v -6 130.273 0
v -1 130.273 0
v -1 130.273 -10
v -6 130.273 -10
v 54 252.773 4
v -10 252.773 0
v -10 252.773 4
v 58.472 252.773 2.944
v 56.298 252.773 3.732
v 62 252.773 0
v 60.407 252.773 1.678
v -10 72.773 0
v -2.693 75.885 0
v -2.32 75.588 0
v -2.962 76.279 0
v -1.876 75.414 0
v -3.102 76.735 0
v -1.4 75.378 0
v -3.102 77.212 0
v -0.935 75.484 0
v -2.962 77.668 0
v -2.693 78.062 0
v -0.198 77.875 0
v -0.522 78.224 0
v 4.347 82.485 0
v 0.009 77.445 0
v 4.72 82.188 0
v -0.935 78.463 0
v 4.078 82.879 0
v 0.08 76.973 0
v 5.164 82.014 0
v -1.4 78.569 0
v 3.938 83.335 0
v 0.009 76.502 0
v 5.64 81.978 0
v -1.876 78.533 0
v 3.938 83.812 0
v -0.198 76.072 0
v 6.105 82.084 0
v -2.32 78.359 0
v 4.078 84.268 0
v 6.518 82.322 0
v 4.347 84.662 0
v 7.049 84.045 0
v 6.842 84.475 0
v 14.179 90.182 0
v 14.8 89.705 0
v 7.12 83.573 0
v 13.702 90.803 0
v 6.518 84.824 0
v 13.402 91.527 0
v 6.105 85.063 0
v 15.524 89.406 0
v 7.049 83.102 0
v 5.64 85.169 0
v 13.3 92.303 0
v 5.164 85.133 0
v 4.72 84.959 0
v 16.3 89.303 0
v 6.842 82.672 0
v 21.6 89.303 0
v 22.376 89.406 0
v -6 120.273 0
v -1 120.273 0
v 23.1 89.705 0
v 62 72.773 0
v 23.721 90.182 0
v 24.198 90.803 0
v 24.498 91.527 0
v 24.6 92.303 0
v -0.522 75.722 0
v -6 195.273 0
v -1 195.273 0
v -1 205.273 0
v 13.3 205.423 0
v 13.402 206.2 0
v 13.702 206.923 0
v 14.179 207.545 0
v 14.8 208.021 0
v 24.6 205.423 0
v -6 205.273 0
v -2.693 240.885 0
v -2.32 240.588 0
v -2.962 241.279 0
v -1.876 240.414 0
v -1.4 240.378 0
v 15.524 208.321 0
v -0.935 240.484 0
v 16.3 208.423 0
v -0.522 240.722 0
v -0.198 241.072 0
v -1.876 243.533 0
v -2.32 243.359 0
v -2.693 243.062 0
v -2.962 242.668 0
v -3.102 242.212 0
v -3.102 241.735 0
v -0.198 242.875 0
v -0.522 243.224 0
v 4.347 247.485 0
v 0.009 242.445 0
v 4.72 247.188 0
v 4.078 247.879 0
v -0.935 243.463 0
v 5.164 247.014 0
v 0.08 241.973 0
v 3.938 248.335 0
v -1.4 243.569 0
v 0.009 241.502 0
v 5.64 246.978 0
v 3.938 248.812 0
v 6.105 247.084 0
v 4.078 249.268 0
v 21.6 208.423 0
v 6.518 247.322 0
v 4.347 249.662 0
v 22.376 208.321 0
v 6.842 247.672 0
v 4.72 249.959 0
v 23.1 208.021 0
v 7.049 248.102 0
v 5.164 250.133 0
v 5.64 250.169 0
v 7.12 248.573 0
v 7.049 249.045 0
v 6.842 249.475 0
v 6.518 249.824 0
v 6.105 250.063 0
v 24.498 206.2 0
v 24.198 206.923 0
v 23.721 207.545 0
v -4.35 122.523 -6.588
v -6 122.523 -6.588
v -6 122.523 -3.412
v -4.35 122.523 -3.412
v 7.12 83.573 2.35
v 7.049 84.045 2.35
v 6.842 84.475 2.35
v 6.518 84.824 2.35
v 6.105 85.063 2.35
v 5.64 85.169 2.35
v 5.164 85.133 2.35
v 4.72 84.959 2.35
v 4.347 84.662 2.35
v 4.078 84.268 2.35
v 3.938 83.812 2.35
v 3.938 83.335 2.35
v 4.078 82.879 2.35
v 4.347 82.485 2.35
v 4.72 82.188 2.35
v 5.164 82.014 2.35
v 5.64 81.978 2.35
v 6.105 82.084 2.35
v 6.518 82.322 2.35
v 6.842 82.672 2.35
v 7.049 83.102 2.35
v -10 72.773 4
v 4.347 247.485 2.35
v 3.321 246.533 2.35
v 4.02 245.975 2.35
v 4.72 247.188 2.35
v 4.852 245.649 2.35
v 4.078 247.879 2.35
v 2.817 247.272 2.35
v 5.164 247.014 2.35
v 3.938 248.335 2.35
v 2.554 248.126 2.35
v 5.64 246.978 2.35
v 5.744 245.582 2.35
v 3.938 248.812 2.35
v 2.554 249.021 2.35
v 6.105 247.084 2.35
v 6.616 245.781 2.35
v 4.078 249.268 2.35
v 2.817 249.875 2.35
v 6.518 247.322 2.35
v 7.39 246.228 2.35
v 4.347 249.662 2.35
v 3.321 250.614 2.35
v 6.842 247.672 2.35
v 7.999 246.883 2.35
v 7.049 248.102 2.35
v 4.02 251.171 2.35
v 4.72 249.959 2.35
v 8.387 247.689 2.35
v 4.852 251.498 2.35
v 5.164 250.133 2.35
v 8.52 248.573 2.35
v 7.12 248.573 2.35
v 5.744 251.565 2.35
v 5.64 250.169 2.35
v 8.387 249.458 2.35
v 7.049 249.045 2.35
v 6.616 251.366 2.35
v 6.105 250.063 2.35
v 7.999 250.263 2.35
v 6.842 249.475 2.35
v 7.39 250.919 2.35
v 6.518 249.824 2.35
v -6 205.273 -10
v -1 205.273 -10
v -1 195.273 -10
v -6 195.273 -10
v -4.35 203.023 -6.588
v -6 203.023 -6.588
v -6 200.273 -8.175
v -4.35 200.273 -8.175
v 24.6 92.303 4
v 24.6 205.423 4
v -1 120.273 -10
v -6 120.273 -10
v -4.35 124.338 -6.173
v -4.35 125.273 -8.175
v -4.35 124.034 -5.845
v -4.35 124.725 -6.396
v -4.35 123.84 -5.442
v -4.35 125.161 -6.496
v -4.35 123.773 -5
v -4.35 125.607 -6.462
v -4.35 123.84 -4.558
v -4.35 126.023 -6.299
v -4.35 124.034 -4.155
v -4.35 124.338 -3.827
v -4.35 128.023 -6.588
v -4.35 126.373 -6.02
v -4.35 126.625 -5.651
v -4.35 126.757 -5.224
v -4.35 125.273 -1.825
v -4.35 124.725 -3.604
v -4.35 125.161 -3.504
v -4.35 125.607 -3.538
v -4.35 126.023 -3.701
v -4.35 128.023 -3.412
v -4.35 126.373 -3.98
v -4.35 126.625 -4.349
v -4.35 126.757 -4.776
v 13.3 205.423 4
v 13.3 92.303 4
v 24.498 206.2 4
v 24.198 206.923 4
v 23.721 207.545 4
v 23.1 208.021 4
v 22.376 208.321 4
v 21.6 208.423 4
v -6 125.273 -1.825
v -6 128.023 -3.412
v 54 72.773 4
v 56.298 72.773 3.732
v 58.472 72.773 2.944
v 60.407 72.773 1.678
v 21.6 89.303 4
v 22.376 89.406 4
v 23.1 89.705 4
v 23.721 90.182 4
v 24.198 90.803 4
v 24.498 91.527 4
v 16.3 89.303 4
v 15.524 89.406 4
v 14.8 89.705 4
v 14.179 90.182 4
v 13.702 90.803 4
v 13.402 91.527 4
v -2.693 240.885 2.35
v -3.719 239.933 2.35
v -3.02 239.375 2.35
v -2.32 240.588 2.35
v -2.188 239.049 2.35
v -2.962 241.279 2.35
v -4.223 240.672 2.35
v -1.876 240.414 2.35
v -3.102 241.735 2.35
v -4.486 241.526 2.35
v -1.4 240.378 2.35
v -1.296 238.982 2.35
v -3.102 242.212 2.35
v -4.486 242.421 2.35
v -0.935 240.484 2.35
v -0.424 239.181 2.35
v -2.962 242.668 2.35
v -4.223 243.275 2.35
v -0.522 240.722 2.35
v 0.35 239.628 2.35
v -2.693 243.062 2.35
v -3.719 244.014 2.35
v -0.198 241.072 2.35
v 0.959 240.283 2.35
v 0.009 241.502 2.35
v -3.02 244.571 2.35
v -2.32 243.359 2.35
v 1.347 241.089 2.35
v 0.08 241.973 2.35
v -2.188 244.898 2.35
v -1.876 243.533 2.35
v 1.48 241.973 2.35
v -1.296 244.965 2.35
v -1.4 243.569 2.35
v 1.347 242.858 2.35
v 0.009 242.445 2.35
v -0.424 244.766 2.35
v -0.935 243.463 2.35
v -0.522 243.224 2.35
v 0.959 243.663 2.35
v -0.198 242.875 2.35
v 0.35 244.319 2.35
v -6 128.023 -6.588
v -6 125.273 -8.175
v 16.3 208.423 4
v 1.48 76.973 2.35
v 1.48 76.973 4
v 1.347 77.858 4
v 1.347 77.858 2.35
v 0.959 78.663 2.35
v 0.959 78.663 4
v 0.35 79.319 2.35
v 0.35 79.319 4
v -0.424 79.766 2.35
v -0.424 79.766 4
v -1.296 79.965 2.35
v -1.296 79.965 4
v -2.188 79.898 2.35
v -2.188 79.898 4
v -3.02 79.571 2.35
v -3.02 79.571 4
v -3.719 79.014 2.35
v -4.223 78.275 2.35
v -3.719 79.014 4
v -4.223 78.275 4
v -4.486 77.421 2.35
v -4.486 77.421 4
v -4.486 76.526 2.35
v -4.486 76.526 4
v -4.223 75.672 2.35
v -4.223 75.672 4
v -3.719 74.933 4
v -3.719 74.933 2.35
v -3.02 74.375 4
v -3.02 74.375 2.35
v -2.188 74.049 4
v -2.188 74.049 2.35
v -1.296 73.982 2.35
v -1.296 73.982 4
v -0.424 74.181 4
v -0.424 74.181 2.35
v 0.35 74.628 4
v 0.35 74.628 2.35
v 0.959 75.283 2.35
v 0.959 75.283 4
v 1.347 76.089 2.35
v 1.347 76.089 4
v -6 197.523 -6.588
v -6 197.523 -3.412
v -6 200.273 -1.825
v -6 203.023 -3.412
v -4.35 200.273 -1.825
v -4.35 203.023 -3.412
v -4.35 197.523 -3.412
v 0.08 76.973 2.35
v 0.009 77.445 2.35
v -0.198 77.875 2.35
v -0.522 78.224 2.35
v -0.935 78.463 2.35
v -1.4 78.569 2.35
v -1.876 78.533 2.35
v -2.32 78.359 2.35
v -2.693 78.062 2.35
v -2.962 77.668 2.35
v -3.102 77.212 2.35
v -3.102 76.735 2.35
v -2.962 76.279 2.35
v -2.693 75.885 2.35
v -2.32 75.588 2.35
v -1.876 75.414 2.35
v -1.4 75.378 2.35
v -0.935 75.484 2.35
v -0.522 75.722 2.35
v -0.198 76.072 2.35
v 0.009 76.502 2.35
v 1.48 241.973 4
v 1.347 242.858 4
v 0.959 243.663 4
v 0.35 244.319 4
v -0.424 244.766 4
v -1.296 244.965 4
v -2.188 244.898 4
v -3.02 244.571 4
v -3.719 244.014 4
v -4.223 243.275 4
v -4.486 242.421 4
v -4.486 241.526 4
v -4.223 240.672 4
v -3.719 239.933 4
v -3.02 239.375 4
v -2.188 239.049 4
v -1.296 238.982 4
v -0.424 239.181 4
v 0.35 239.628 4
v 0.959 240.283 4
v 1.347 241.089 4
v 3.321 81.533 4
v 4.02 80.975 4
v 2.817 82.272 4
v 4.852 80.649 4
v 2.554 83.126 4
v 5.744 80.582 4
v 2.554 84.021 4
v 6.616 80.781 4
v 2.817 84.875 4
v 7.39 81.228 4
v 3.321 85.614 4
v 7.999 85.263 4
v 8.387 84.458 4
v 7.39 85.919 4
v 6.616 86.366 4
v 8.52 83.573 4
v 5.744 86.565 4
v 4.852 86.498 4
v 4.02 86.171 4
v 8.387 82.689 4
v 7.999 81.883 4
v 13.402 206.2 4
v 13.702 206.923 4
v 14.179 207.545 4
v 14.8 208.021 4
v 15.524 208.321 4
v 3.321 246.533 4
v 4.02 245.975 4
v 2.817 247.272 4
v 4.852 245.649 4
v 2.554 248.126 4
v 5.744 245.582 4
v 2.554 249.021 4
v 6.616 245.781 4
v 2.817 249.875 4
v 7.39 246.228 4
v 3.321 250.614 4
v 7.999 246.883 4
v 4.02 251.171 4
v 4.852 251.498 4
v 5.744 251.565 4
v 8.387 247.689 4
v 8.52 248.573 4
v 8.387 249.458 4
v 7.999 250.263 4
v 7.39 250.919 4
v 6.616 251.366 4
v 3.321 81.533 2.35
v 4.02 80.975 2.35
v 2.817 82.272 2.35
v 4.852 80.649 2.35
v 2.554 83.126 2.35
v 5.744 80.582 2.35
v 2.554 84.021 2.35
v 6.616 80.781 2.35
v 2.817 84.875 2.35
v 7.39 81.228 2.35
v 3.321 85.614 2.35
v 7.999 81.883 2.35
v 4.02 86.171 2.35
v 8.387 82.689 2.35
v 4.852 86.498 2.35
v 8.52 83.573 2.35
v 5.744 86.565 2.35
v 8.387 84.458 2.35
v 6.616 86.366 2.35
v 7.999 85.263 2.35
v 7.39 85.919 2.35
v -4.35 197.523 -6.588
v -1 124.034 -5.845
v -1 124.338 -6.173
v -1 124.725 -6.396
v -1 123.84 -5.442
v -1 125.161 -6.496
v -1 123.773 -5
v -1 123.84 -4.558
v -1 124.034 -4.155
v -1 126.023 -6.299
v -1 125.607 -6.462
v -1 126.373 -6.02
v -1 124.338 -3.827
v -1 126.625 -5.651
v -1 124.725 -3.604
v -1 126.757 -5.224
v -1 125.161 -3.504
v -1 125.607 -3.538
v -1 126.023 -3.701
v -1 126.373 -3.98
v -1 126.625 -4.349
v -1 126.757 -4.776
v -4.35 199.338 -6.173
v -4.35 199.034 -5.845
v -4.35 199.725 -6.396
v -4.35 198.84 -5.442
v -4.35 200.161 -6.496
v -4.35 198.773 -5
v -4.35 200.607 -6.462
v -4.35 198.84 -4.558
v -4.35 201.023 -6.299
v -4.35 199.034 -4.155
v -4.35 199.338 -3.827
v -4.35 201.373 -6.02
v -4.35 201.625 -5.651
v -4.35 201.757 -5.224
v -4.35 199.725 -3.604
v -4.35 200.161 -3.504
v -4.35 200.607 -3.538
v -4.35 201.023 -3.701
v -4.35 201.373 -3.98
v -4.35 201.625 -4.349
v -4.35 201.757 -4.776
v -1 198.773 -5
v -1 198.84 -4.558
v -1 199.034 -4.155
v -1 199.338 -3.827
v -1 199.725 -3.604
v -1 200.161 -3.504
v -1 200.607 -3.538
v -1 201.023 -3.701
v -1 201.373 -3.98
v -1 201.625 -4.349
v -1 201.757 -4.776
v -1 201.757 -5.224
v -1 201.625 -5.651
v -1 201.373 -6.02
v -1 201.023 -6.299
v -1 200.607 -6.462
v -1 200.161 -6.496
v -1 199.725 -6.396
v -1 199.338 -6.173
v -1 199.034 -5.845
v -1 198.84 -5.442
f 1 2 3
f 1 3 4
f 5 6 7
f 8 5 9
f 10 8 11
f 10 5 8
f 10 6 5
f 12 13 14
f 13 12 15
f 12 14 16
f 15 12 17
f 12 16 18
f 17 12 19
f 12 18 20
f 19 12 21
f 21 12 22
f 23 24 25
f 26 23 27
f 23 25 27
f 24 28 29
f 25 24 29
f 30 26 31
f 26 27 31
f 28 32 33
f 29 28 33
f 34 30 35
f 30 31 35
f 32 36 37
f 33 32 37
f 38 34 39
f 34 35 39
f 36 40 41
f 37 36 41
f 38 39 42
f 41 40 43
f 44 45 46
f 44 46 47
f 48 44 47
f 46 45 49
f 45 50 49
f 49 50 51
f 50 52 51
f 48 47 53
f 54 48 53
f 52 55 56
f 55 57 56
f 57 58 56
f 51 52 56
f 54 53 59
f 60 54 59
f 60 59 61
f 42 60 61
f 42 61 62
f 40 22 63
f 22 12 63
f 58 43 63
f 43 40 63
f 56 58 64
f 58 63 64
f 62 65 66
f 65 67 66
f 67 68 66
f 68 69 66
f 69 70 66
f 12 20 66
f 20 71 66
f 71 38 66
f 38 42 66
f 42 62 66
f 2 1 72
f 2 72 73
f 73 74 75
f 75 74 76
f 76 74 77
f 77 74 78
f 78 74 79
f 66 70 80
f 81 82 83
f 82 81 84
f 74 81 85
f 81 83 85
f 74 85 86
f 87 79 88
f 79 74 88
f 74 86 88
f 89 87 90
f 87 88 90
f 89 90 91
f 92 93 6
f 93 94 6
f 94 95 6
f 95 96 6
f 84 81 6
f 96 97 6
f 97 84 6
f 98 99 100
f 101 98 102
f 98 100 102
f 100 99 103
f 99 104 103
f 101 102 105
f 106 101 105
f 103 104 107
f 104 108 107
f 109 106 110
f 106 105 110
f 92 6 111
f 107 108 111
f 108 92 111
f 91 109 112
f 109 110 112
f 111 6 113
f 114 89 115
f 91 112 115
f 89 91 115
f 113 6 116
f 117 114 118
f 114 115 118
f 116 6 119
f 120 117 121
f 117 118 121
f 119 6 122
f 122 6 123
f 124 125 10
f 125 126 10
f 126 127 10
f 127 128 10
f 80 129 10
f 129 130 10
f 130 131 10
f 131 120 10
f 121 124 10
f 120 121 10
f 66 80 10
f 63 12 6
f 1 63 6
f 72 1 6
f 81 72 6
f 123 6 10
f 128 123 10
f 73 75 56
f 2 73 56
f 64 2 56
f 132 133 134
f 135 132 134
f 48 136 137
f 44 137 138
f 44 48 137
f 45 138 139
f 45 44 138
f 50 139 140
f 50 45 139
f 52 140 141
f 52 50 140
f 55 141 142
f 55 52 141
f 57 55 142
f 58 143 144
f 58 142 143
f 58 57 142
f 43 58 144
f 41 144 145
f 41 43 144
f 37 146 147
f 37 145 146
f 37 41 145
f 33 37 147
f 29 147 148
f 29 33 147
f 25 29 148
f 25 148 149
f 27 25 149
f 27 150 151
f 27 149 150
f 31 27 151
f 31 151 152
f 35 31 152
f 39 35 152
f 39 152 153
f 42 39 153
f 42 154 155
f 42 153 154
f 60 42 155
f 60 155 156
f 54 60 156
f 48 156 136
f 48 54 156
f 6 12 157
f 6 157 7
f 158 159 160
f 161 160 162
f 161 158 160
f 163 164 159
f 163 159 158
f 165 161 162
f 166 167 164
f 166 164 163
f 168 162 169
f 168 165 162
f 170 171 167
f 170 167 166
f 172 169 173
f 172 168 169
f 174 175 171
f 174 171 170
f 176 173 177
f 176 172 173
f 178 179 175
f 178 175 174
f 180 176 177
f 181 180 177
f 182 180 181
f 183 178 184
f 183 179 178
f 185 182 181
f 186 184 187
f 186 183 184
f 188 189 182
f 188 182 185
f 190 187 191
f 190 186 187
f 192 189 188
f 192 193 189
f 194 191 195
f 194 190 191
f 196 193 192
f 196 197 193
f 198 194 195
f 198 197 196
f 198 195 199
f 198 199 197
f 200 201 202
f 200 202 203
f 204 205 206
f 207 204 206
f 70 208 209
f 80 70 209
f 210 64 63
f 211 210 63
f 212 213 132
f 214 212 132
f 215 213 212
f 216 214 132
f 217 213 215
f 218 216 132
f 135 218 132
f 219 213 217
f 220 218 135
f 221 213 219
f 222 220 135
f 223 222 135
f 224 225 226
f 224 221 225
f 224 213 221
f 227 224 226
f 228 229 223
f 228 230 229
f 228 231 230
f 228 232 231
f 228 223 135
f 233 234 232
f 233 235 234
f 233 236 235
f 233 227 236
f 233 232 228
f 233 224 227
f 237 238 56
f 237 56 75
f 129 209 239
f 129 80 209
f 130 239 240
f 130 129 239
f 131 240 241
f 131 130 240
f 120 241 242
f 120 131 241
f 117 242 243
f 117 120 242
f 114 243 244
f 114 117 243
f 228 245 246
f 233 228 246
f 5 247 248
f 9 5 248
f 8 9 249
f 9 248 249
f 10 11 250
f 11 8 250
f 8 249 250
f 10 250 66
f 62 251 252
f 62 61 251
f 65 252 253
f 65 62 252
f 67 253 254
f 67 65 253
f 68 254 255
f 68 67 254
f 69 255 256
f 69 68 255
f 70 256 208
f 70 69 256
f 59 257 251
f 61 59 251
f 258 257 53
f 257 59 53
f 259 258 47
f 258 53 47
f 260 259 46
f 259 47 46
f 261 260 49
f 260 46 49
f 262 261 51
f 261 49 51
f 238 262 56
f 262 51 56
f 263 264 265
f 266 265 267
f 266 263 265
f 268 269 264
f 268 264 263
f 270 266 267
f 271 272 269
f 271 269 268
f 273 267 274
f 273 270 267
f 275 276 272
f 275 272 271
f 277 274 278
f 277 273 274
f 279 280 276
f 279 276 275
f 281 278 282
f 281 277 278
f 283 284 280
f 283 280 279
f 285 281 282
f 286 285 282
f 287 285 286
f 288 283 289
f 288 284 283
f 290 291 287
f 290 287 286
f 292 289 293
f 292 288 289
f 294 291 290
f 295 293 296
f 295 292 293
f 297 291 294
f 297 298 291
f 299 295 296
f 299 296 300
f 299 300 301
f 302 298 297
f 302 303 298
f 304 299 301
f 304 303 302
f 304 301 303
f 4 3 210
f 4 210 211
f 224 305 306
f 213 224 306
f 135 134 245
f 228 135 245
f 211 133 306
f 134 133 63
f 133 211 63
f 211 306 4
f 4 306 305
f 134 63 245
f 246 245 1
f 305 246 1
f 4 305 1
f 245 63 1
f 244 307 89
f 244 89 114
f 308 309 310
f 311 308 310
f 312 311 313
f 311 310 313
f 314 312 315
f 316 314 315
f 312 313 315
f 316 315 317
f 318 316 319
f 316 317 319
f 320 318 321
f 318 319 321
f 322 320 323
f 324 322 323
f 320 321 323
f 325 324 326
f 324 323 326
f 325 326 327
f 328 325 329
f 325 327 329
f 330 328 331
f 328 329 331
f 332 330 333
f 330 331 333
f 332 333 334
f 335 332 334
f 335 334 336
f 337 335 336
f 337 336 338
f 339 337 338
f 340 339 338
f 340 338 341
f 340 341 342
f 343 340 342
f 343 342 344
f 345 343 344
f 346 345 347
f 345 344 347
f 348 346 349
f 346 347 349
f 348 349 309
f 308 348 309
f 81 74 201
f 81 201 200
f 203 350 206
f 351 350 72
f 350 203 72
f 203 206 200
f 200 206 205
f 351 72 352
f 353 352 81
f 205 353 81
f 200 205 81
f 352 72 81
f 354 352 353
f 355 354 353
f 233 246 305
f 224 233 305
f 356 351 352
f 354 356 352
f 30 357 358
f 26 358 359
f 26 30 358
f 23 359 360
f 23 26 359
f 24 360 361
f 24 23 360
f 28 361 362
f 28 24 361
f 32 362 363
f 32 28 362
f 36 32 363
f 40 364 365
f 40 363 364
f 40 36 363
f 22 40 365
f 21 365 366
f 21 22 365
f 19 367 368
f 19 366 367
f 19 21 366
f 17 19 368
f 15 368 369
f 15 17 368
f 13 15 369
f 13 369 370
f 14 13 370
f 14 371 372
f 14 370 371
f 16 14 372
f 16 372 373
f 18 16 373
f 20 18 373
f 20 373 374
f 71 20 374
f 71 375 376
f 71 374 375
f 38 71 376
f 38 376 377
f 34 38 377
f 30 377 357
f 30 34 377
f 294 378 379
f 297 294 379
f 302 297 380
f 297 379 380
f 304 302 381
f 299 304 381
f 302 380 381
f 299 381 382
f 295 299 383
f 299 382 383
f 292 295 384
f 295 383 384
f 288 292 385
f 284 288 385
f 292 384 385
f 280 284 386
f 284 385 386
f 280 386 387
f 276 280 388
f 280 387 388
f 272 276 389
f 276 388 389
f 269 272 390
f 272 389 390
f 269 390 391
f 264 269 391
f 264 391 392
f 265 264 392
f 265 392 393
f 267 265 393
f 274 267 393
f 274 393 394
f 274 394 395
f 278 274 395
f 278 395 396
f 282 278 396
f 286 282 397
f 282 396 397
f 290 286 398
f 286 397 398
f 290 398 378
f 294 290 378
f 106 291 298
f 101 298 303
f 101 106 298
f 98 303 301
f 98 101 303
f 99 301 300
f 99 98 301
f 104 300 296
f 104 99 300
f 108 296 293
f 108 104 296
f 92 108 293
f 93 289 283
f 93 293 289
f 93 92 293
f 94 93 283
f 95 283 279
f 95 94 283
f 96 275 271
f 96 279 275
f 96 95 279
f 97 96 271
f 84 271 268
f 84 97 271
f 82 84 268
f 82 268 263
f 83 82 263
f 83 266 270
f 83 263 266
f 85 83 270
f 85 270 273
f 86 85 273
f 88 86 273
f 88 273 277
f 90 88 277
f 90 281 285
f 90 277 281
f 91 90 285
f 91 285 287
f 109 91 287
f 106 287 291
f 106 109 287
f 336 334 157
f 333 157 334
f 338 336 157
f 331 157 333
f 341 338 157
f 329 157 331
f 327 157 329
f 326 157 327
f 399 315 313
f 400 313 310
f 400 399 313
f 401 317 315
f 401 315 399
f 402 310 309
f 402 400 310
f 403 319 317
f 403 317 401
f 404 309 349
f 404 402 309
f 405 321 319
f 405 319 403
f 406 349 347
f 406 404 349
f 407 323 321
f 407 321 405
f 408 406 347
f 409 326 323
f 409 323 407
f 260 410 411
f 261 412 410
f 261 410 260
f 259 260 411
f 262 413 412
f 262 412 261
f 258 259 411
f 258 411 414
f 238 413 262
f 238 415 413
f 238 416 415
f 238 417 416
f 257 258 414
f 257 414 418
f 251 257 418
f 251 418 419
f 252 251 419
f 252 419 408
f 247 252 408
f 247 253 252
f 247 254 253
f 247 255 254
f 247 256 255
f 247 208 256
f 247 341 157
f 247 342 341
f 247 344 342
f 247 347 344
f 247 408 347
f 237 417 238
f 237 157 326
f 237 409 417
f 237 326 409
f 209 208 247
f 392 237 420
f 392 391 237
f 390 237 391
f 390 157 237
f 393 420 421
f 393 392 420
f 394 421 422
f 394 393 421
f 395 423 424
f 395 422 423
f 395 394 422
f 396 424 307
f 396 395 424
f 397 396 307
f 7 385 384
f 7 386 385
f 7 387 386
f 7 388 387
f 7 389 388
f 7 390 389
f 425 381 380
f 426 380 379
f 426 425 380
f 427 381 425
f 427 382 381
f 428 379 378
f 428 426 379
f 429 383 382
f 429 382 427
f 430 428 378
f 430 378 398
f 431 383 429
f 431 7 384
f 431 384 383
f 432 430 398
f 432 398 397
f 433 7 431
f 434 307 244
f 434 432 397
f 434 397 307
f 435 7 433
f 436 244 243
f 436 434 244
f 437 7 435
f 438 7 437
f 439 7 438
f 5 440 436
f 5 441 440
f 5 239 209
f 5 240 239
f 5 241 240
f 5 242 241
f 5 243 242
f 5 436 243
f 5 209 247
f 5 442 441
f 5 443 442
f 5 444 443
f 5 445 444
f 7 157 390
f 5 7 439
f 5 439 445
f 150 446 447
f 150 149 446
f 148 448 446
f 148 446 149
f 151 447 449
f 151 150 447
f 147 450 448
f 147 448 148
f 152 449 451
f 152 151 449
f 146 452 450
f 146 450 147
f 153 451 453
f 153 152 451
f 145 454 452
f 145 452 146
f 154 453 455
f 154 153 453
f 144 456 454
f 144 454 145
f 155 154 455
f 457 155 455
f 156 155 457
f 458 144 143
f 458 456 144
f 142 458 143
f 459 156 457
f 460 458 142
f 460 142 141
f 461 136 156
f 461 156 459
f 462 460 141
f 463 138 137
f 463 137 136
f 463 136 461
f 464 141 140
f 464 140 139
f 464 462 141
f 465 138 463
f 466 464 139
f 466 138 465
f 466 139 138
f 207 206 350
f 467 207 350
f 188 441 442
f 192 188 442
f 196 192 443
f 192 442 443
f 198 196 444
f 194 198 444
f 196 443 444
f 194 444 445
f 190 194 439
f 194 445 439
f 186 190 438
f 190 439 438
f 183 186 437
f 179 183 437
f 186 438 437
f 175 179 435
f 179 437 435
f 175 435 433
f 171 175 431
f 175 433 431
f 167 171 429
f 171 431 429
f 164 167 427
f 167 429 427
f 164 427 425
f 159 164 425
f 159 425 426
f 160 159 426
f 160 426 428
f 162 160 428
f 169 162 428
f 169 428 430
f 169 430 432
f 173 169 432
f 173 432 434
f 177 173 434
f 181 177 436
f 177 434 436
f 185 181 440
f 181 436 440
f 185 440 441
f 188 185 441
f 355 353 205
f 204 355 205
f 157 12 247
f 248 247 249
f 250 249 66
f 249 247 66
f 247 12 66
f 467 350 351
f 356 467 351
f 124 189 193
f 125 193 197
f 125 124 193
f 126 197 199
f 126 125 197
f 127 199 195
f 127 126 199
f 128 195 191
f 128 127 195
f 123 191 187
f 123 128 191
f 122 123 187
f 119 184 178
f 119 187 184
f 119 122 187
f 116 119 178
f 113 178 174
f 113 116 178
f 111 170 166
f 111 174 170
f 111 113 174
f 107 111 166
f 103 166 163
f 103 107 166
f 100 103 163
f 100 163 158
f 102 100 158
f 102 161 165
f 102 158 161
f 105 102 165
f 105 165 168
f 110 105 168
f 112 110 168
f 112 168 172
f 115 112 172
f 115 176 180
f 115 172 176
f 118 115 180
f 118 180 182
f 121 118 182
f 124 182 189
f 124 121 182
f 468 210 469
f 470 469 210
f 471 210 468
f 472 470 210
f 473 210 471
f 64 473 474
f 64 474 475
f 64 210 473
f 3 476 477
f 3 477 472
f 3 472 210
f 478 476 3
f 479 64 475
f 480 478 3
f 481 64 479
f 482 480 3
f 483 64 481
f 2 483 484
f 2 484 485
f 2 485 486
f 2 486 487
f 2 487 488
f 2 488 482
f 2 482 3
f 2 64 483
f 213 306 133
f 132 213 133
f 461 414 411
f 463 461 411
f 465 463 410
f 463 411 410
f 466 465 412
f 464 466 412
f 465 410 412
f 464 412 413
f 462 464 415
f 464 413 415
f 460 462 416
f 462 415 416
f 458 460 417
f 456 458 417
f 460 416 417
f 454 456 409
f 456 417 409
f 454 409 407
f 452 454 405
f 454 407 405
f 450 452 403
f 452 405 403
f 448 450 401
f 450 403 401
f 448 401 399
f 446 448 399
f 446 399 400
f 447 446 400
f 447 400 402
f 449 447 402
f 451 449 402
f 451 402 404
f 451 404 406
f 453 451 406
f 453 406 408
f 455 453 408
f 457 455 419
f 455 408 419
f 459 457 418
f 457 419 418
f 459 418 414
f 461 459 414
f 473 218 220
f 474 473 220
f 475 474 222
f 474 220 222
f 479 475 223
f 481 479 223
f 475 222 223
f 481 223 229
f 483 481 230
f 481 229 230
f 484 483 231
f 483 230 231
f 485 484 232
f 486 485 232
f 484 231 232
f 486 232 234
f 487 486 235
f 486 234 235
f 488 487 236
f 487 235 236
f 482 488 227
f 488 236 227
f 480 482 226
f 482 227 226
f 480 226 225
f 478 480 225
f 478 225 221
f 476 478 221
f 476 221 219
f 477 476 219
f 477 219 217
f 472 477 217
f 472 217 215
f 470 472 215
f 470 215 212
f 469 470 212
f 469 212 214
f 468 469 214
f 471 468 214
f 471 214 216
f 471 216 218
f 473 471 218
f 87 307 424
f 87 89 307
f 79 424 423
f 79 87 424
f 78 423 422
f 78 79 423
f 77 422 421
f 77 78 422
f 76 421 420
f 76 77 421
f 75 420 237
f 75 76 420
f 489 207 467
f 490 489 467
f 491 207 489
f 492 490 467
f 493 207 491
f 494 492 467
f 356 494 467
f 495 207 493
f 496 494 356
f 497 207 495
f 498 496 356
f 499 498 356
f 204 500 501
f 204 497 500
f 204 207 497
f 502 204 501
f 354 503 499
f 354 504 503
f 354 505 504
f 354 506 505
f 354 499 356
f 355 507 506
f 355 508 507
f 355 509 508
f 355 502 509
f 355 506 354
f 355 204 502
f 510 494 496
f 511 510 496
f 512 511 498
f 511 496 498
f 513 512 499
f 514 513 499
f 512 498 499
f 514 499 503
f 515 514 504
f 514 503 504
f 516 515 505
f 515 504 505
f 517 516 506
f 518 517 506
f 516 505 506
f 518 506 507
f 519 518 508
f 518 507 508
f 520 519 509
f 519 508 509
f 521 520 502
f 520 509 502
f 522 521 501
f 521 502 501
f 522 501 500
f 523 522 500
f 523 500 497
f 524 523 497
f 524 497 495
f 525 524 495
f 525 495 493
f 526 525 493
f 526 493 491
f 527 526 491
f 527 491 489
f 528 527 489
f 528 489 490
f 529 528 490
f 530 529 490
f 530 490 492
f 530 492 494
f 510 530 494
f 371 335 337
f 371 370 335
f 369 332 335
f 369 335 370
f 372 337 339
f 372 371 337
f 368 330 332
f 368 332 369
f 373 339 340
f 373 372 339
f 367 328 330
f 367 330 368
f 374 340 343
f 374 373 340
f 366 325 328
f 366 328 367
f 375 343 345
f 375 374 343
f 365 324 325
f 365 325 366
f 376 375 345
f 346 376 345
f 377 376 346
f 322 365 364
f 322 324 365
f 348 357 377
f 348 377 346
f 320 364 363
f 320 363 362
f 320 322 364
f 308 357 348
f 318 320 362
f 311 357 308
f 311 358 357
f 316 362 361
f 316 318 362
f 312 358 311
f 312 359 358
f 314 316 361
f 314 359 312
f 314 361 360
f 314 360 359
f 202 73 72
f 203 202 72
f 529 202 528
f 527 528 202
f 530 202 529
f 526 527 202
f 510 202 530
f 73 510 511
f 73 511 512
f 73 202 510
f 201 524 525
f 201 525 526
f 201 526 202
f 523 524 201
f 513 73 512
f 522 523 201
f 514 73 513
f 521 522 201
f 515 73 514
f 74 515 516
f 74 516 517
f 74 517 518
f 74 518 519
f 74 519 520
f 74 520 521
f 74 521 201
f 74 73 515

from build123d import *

# Parameters (mm, degrees)
CROQUIS1_W              = 72
CROQUIS1_H              = 180
CROQUIS1_R              = 1.6
SALIENTE_EXTRUIR1_DEPTH = 4
CROQUIS2_R              = 3
CORTAR_EXTRUIR1_DEPTH   = 1.65
CROQUIS3_W              = 5
CROQUIS3_H              = 10
SALIENTE_EXTRUIR2_DEPTH = 10
CORTAR_EXTRUIR2_REACH   = 263.951
CROQUIS4_R              = 1.5
CROQUIS4_3_R            = 1.5
CORTAR_EXTRUIR3_DEPTH   = 1.65
REDONDEO2_R             = 10
CORTAR_EXTRUIR4_REACH   = 262.458
CROQUIS6_W              = 11.3
CROQUIS6_H              = 119.12
CORTAR_EXTRUIR5_DEPTH   = 4
REDONDEO3_R             = 3


with BuildPart() as part:
    # Croquis1 → Saliente-Extruir1 (new body)
    with BuildSketch(Plane.XY):
        with Locations((26, 162.773389683)):
            Rectangle(CROQUIS1_W, CROQUIS1_H)
        with Locations((-1.52, 76.973389683)):
            Circle(CROQUIS1_R, mode=Mode.SUBTRACT)
        with Locations((5.52, 83.573389683)):
            Circle(CROQUIS1_R, mode=Mode.SUBTRACT)
        with Locations((-1.52, 241.973389683)):
            Circle(CROQUIS1_R, mode=Mode.SUBTRACT)
        with Locations((5.52, 248.573389683)):
            Circle(CROQUIS1_R, mode=Mode.SUBTRACT)
    extrude(amount=SALIENTE_EXTRUIR1_DEPTH)

    # Croquis2 → Cortar-Extruir1 (cut)
    with BuildSketch(Plane.XY.offset(4)):
        with Locations((-1.52, 76.973389683)):
            Circle(CROQUIS2_R)
        with Locations((5.52, 83.573389683)):
            Circle(CROQUIS2_R)
        with Locations((-1.52, 241.973389683)):
            Circle(CROQUIS2_R)
        with Locations((5.52, 248.573389683)):
            Circle(CROQUIS2_R)
    extrude(amount=-CORTAR_EXTRUIR1_DEPTH, mode=Mode.SUBTRACT)

    # Croquis3 → Saliente-Extruir2 (add)
    with BuildSketch(Plane(origin=(0, 0, 0), x_dir=(-1, 0, 0), z_dir=(0, 0, -1))):
        with Locations((3.5, 125.273389683)):
            Rectangle(CROQUIS3_W, CROQUIS3_H)
        with Locations((3.5, 200.273389683)):
            Rectangle(CROQUIS3_W, CROQUIS3_H)
    extrude(amount=SALIENTE_EXTRUIR2_DEPTH)

    # Croquis4 → Cortar-Extruir2 (cut, up to next)
    with BuildSketch(Plane.ZY.offset(6), mode=Mode.PRIVATE) as cortar_extruir2_sk1:
        with Locations(Location((-5, 125.273389683, 0), (0, 0, 270))):
            Circle(CROQUIS4_R)
    cortar_extruir2_tool1 = extrude(cortar_extruir2_sk1.sketch, amount=-CORTAR_EXTRUIR2_REACH, mode=Mode.PRIVATE) & part.part
    # Croquis4 → Cortar-Extruir2 (cut, up to next)
    with BuildSketch(Plane.ZY.offset(6), mode=Mode.PRIVATE) as cortar_extruir2_sk2:
        with Locations(Location((-5, 200.273389683, 0), (0, 0, 270))):
            Circle(CROQUIS4_R)
    cortar_extruir2_tool2 = extrude(cortar_extruir2_sk2.sketch, amount=-CORTAR_EXTRUIR2_REACH, mode=Mode.PRIVATE) & part.part
    add(cortar_extruir2_tool1.solids().sort_by_distance((-6, 125.27339, -5))[0], mode=Mode.SUBTRACT)
    add(cortar_extruir2_tool2.solids().sort_by_distance((-6, 200.27339, -5))[0], mode=Mode.SUBTRACT)

    # Croquis4<3> → Cortar-Extruir3 (cut)
    # profile 1 of 2: a face of its own
    with BuildSketch(Plane.ZY.offset(6)):
        Polygon((-8.175426481, 200.273389683), (-6.58771324, 197.523389683), (-3.41228676, 197.523389683), (-1.824573519, 200.273389683), (-3.41228676, 203.023389683), (-6.58771324, 203.023389683), align=None)
        with Locations(Location((-5, 200.273389683, 0), (0, 0, 270))):
            Circle(CROQUIS4_3_R, mode=Mode.SUBTRACT)
    # profile 2 of 2: a face of its own
    with BuildSketch(Plane.ZY.offset(6)):
        Polygon((-8.175426481, 125.273389683), (-6.58771324, 122.523389683), (-3.41228676, 122.523389683), (-1.824573519, 125.273389683), (-3.41228676, 128.023389683), (-6.58771324, 128.023389683), align=None)
        with Locations(Location((-5, 125.273389683, 0), (0, 0, 270))):
            Circle(CROQUIS4_3_R, mode=Mode.SUBTRACT)
    extrude(amount=-CORTAR_EXTRUIR3_DEPTH, mode=Mode.SUBTRACT)

    # Redondeo2
    # the kernel refuses this fillet: 10 mm, written as the material it takes off along each edge
    with BuildSketch(Plane(origin=(62, 52.773389683, 4), x_dir=(0, 0, -1), z_dir=(0, 1, 0))) as redondeo2_piece_1:
        with BuildLine():
            CenterArc((10, 8), REDONDEO2_R, 180, 53.130102354)
            Line((0, 8), (-0.2, 8))
            Line((-0.2, 8), (-0.2, 0))
            Line((-0.2, 0), (0, -0.2))
            ThreePointArc((0, -0.2), (2, -0.2), (3.88, -0.16))
            Line((3.88, -0.16), (4, 0))
        make_face()
    extrude(amount=220, mode=Mode.SUBTRACT)

    # Croquis5 → Cortar-Extruir4 (cut, up to next)
    with BuildSketch(Plane(origin=(0, 0, 0), x_dir=(-1, 0, 0), z_dir=(0, 0, -1)), mode=Mode.PRIVATE) as cortar_extruir4_sk1:
        with BuildLine():
            Line((-18.04, 177.143389683), (-18.04, 170.803389683))
            ThreePointArc((-18.04, 170.803389683), (-18.479339828, 169.742729511), (-19.54, 169.303389683))
            Line((-19.54, 169.303389683), (-20.1, 169.303389683))
            ThreePointArc((-20.1, 169.303389683), (-21.160660172, 169.742729511), (-21.6, 170.803389683))
            Line((-21.6, 170.803389683), (-21.6, 177.143389683))
            ThreePointArc((-21.6, 177.143389683), (-21.160660172, 178.204049855), (-20.1, 178.643389683))
            Line((-20.1, 178.643389683), (-19.54, 178.643389683))
            ThreePointArc((-19.54, 178.643389683), (-18.479339828, 178.204049855), (-18.04, 177.143389683))
        make_face()
    cortar_extruir4_tool1 = extrude(cortar_extruir4_sk1.sketch, amount=-CORTAR_EXTRUIR4_REACH, mode=Mode.PRIVATE) & part.part
    # Croquis5 → Cortar-Extruir4 (cut, up to next)
    with BuildSketch(Plane(origin=(0, 0, 0), x_dir=(-1, 0, 0), z_dir=(0, 0, -1)), mode=Mode.PRIVATE) as cortar_extruir4_sk2:
        with BuildLine():
            Line((-18.3, 191.373389683), (-18.3, 185.773389683))
            ThreePointArc((-18.3, 185.773389683), (-18.490380592, 185.313770275), (-18.95, 185.123389683))
            Line((-18.95, 185.123389683), (-20.27019783, 185.123389683))
            ThreePointArc((-20.27019783, 185.123389683), (-20.510915139, 185.169605635), (-20.717401742, 185.301681447))
            Line((-20.717401742, 185.301681447), (-21.397203913, 185.946169218))
            ThreePointArc((-21.397203913, 185.946169218), (-21.547152637, 186.161150502), (-21.6, 186.417877455))
            Line((-21.6, 186.417877455), (-21.6, 188.413389575))
            Line((-21.6, 188.413389575), (-21.6, 190.728901911))
            ThreePointArc((-21.6, 190.728901911), (-21.547152637, 190.985628864), (-21.397203913, 191.200610148))
            Line((-21.397203913, 191.200610148), (-20.717401742, 191.84509792))
            ThreePointArc((-20.717401742, 191.84509792), (-20.510915139, 191.977173731), (-20.27019783, 192.023389683))
            Line((-20.27019783, 192.023389683), (-18.95, 192.023389683))
            ThreePointArc((-18.95, 192.023389683), (-18.490380592, 191.833009091), (-18.3, 191.373389683))
        make_face()
    cortar_extruir4_tool2 = extrude(cortar_extruir4_sk2.sketch, amount=-CORTAR_EXTRUIR4_REACH, mode=Mode.PRIVATE) & part.part
    # Croquis5 → Cortar-Extruir4 (cut, up to next)
    with BuildSketch(Plane(origin=(0, 0, 0), x_dir=(-1, 0, 0), z_dir=(0, 0, -1)), mode=Mode.PRIVATE) as cortar_extruir4_sk3:
        with BuildLine():
            Line((-18.95, 198.523389683), (-20.27019783, 198.523389683))
            ThreePointArc((-20.27019783, 198.523389683), (-20.510915139, 198.569605635), (-20.717401742, 198.701681447))
            Line((-20.717401742, 198.701681447), (-21.397203913, 199.346169218))
            ThreePointArc((-21.397203913, 199.346169218), (-21.547152637, 199.561150502), (-21.6, 199.817877455))
            Line((-21.6, 199.817877455), (-21.6, 201.813389575))
            Line((-21.6, 201.813389575), (-21.6, 204.128901911))
            ThreePointArc((-21.6, 204.128901911), (-21.547152637, 204.385628864), (-21.397203913, 204.600610148))
            Line((-21.397203913, 204.600610148), (-20.717401742, 205.24509792))
            ThreePointArc((-20.717401742, 205.24509792), (-20.510915139, 205.377173731), (-20.27019783, 205.423389683))
            Line((-20.27019783, 205.423389683), (-18.95, 205.423389683))
            ThreePointArc((-18.95, 205.423389683), (-18.490380592, 205.233009091), (-18.3, 204.773389683))
            Line((-18.3, 204.773389683), (-18.3, 199.173389683))
            ThreePointArc((-18.3, 199.173389683), (-18.490380592, 198.713770275), (-18.95, 198.523389683))
        make_face()
    cortar_extruir4_tool3 = extrude(cortar_extruir4_sk3.sketch, amount=-CORTAR_EXTRUIR4_REACH, mode=Mode.PRIVATE) & part.part
    add(cortar_extruir4_tool1.solids().sort_by_distance((19.82, 173.97339, 0))[0], mode=Mode.SUBTRACT)
    add(cortar_extruir4_tool2.solids().sort_by_distance((19.895302, 188.57339, 0))[0], mode=Mode.SUBTRACT)
    add(cortar_extruir4_tool3.solids().sort_by_distance((19.895302, 201.97339, 0))[0], mode=Mode.SUBTRACT)

    # Croquis6 → Cortar-Extruir5 (cut)
    with BuildSketch(Plane.XY.offset(4)):
        with Locations((18.95, 148.863389683)):
            Rectangle(CROQUIS6_W, CROQUIS6_H)
    extrude(amount=-CORTAR_EXTRUIR5_DEPTH, mode=Mode.SUBTRACT)

    # Redondeo3
    redondeo3_edges = [part.edges().sort_by_distance(p)[0] for p in [
        (13.3, 89.303389683, 2),
        (13.3, 208.423389683, 2),
        (24.6, 208.423389683, 2),
        (24.6, 89.303389683, 2),
    ]]
    fillet(redondeo3_edges, radius=REDONDEO3_R)


solid = part.part
